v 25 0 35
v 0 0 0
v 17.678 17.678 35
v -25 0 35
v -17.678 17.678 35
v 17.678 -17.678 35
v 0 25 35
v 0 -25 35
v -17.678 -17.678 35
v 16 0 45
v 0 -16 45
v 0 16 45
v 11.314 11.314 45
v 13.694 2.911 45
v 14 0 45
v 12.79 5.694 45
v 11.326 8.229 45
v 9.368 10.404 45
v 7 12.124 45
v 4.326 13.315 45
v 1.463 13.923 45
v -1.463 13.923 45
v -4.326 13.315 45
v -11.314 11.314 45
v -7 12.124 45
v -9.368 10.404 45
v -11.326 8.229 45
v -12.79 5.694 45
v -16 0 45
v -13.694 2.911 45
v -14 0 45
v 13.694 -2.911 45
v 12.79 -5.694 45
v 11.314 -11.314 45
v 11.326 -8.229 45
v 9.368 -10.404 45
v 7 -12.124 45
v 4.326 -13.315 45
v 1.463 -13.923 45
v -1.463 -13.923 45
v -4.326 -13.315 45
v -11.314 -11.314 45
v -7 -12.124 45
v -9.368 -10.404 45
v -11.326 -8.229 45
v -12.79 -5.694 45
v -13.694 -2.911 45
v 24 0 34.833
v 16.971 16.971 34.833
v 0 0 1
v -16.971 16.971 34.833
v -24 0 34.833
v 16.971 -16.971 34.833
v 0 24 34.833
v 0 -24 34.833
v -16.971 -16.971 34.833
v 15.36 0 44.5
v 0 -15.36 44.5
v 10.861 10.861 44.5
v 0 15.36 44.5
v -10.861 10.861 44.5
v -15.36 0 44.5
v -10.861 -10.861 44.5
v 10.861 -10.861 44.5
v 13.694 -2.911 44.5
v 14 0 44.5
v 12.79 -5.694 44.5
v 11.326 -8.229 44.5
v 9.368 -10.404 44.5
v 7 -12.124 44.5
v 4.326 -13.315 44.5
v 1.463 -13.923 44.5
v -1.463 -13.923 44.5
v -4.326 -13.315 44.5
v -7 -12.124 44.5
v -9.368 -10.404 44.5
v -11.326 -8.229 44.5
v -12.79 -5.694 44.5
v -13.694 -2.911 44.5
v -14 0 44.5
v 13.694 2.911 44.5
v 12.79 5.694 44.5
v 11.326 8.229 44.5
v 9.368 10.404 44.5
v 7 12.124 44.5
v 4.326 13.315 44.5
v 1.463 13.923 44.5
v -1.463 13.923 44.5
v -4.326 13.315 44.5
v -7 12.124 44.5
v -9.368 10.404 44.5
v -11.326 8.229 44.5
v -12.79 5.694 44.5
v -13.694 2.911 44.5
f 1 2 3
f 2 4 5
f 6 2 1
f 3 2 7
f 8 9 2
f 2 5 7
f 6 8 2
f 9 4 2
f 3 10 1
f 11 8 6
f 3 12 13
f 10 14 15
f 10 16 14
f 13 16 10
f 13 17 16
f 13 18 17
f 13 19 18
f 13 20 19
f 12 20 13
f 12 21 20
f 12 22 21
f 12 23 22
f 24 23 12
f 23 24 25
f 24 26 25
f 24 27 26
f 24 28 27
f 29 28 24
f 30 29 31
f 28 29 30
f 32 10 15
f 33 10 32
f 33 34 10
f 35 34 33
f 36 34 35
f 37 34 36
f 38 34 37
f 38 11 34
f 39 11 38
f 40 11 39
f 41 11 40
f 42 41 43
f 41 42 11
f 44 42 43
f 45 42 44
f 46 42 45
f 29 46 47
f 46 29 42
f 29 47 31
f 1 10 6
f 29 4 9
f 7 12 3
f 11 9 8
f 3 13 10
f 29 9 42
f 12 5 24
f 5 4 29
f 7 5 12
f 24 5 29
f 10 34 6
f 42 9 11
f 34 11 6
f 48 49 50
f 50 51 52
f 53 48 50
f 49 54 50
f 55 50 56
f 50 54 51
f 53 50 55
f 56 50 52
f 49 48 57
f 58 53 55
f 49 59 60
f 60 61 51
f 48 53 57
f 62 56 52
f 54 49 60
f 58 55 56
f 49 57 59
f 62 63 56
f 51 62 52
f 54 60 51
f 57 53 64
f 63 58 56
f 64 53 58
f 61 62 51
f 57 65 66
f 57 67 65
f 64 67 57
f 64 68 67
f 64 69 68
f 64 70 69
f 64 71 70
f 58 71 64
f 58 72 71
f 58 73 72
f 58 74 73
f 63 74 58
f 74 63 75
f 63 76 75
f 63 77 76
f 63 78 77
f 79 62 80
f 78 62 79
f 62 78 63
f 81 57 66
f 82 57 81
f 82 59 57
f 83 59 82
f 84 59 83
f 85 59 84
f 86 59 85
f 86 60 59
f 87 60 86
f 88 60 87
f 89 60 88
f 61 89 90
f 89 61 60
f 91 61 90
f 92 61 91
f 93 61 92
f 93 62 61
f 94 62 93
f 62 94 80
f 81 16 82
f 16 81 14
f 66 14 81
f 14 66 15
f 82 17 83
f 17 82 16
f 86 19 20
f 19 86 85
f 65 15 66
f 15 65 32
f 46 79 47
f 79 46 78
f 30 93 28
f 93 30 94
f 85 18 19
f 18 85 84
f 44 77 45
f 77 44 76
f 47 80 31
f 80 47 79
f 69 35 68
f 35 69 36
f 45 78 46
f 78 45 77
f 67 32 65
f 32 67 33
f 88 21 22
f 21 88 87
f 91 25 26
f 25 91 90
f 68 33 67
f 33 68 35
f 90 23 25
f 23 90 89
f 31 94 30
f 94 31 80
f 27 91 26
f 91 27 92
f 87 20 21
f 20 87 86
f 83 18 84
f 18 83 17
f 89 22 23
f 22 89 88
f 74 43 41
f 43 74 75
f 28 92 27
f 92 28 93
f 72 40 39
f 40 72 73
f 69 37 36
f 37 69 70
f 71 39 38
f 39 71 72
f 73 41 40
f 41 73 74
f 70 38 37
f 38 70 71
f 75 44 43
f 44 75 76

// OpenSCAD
$fn=30;

module diamond(w, w2, h1, h2) {
    $fn=8;
    cylinder(d1=0, d2=w, h=h1);
    translate([0, 0, h1]) cylinder(d1=w, d2=w2, h=h2);
}

module dvase(w, w2, h1, h2) {
    difference() {
            diamond(w, w2, h1, h2);
            translate([0, 0, 1]) resize([w-2, w-2, h1+h2-1.5]) diamond(w, w2, h1, h2);
            translate([0, 0, h1]) cylinder(d=w2-4, h=h2+.1);
    }
}

dvase(50, 32, 35, 10);
